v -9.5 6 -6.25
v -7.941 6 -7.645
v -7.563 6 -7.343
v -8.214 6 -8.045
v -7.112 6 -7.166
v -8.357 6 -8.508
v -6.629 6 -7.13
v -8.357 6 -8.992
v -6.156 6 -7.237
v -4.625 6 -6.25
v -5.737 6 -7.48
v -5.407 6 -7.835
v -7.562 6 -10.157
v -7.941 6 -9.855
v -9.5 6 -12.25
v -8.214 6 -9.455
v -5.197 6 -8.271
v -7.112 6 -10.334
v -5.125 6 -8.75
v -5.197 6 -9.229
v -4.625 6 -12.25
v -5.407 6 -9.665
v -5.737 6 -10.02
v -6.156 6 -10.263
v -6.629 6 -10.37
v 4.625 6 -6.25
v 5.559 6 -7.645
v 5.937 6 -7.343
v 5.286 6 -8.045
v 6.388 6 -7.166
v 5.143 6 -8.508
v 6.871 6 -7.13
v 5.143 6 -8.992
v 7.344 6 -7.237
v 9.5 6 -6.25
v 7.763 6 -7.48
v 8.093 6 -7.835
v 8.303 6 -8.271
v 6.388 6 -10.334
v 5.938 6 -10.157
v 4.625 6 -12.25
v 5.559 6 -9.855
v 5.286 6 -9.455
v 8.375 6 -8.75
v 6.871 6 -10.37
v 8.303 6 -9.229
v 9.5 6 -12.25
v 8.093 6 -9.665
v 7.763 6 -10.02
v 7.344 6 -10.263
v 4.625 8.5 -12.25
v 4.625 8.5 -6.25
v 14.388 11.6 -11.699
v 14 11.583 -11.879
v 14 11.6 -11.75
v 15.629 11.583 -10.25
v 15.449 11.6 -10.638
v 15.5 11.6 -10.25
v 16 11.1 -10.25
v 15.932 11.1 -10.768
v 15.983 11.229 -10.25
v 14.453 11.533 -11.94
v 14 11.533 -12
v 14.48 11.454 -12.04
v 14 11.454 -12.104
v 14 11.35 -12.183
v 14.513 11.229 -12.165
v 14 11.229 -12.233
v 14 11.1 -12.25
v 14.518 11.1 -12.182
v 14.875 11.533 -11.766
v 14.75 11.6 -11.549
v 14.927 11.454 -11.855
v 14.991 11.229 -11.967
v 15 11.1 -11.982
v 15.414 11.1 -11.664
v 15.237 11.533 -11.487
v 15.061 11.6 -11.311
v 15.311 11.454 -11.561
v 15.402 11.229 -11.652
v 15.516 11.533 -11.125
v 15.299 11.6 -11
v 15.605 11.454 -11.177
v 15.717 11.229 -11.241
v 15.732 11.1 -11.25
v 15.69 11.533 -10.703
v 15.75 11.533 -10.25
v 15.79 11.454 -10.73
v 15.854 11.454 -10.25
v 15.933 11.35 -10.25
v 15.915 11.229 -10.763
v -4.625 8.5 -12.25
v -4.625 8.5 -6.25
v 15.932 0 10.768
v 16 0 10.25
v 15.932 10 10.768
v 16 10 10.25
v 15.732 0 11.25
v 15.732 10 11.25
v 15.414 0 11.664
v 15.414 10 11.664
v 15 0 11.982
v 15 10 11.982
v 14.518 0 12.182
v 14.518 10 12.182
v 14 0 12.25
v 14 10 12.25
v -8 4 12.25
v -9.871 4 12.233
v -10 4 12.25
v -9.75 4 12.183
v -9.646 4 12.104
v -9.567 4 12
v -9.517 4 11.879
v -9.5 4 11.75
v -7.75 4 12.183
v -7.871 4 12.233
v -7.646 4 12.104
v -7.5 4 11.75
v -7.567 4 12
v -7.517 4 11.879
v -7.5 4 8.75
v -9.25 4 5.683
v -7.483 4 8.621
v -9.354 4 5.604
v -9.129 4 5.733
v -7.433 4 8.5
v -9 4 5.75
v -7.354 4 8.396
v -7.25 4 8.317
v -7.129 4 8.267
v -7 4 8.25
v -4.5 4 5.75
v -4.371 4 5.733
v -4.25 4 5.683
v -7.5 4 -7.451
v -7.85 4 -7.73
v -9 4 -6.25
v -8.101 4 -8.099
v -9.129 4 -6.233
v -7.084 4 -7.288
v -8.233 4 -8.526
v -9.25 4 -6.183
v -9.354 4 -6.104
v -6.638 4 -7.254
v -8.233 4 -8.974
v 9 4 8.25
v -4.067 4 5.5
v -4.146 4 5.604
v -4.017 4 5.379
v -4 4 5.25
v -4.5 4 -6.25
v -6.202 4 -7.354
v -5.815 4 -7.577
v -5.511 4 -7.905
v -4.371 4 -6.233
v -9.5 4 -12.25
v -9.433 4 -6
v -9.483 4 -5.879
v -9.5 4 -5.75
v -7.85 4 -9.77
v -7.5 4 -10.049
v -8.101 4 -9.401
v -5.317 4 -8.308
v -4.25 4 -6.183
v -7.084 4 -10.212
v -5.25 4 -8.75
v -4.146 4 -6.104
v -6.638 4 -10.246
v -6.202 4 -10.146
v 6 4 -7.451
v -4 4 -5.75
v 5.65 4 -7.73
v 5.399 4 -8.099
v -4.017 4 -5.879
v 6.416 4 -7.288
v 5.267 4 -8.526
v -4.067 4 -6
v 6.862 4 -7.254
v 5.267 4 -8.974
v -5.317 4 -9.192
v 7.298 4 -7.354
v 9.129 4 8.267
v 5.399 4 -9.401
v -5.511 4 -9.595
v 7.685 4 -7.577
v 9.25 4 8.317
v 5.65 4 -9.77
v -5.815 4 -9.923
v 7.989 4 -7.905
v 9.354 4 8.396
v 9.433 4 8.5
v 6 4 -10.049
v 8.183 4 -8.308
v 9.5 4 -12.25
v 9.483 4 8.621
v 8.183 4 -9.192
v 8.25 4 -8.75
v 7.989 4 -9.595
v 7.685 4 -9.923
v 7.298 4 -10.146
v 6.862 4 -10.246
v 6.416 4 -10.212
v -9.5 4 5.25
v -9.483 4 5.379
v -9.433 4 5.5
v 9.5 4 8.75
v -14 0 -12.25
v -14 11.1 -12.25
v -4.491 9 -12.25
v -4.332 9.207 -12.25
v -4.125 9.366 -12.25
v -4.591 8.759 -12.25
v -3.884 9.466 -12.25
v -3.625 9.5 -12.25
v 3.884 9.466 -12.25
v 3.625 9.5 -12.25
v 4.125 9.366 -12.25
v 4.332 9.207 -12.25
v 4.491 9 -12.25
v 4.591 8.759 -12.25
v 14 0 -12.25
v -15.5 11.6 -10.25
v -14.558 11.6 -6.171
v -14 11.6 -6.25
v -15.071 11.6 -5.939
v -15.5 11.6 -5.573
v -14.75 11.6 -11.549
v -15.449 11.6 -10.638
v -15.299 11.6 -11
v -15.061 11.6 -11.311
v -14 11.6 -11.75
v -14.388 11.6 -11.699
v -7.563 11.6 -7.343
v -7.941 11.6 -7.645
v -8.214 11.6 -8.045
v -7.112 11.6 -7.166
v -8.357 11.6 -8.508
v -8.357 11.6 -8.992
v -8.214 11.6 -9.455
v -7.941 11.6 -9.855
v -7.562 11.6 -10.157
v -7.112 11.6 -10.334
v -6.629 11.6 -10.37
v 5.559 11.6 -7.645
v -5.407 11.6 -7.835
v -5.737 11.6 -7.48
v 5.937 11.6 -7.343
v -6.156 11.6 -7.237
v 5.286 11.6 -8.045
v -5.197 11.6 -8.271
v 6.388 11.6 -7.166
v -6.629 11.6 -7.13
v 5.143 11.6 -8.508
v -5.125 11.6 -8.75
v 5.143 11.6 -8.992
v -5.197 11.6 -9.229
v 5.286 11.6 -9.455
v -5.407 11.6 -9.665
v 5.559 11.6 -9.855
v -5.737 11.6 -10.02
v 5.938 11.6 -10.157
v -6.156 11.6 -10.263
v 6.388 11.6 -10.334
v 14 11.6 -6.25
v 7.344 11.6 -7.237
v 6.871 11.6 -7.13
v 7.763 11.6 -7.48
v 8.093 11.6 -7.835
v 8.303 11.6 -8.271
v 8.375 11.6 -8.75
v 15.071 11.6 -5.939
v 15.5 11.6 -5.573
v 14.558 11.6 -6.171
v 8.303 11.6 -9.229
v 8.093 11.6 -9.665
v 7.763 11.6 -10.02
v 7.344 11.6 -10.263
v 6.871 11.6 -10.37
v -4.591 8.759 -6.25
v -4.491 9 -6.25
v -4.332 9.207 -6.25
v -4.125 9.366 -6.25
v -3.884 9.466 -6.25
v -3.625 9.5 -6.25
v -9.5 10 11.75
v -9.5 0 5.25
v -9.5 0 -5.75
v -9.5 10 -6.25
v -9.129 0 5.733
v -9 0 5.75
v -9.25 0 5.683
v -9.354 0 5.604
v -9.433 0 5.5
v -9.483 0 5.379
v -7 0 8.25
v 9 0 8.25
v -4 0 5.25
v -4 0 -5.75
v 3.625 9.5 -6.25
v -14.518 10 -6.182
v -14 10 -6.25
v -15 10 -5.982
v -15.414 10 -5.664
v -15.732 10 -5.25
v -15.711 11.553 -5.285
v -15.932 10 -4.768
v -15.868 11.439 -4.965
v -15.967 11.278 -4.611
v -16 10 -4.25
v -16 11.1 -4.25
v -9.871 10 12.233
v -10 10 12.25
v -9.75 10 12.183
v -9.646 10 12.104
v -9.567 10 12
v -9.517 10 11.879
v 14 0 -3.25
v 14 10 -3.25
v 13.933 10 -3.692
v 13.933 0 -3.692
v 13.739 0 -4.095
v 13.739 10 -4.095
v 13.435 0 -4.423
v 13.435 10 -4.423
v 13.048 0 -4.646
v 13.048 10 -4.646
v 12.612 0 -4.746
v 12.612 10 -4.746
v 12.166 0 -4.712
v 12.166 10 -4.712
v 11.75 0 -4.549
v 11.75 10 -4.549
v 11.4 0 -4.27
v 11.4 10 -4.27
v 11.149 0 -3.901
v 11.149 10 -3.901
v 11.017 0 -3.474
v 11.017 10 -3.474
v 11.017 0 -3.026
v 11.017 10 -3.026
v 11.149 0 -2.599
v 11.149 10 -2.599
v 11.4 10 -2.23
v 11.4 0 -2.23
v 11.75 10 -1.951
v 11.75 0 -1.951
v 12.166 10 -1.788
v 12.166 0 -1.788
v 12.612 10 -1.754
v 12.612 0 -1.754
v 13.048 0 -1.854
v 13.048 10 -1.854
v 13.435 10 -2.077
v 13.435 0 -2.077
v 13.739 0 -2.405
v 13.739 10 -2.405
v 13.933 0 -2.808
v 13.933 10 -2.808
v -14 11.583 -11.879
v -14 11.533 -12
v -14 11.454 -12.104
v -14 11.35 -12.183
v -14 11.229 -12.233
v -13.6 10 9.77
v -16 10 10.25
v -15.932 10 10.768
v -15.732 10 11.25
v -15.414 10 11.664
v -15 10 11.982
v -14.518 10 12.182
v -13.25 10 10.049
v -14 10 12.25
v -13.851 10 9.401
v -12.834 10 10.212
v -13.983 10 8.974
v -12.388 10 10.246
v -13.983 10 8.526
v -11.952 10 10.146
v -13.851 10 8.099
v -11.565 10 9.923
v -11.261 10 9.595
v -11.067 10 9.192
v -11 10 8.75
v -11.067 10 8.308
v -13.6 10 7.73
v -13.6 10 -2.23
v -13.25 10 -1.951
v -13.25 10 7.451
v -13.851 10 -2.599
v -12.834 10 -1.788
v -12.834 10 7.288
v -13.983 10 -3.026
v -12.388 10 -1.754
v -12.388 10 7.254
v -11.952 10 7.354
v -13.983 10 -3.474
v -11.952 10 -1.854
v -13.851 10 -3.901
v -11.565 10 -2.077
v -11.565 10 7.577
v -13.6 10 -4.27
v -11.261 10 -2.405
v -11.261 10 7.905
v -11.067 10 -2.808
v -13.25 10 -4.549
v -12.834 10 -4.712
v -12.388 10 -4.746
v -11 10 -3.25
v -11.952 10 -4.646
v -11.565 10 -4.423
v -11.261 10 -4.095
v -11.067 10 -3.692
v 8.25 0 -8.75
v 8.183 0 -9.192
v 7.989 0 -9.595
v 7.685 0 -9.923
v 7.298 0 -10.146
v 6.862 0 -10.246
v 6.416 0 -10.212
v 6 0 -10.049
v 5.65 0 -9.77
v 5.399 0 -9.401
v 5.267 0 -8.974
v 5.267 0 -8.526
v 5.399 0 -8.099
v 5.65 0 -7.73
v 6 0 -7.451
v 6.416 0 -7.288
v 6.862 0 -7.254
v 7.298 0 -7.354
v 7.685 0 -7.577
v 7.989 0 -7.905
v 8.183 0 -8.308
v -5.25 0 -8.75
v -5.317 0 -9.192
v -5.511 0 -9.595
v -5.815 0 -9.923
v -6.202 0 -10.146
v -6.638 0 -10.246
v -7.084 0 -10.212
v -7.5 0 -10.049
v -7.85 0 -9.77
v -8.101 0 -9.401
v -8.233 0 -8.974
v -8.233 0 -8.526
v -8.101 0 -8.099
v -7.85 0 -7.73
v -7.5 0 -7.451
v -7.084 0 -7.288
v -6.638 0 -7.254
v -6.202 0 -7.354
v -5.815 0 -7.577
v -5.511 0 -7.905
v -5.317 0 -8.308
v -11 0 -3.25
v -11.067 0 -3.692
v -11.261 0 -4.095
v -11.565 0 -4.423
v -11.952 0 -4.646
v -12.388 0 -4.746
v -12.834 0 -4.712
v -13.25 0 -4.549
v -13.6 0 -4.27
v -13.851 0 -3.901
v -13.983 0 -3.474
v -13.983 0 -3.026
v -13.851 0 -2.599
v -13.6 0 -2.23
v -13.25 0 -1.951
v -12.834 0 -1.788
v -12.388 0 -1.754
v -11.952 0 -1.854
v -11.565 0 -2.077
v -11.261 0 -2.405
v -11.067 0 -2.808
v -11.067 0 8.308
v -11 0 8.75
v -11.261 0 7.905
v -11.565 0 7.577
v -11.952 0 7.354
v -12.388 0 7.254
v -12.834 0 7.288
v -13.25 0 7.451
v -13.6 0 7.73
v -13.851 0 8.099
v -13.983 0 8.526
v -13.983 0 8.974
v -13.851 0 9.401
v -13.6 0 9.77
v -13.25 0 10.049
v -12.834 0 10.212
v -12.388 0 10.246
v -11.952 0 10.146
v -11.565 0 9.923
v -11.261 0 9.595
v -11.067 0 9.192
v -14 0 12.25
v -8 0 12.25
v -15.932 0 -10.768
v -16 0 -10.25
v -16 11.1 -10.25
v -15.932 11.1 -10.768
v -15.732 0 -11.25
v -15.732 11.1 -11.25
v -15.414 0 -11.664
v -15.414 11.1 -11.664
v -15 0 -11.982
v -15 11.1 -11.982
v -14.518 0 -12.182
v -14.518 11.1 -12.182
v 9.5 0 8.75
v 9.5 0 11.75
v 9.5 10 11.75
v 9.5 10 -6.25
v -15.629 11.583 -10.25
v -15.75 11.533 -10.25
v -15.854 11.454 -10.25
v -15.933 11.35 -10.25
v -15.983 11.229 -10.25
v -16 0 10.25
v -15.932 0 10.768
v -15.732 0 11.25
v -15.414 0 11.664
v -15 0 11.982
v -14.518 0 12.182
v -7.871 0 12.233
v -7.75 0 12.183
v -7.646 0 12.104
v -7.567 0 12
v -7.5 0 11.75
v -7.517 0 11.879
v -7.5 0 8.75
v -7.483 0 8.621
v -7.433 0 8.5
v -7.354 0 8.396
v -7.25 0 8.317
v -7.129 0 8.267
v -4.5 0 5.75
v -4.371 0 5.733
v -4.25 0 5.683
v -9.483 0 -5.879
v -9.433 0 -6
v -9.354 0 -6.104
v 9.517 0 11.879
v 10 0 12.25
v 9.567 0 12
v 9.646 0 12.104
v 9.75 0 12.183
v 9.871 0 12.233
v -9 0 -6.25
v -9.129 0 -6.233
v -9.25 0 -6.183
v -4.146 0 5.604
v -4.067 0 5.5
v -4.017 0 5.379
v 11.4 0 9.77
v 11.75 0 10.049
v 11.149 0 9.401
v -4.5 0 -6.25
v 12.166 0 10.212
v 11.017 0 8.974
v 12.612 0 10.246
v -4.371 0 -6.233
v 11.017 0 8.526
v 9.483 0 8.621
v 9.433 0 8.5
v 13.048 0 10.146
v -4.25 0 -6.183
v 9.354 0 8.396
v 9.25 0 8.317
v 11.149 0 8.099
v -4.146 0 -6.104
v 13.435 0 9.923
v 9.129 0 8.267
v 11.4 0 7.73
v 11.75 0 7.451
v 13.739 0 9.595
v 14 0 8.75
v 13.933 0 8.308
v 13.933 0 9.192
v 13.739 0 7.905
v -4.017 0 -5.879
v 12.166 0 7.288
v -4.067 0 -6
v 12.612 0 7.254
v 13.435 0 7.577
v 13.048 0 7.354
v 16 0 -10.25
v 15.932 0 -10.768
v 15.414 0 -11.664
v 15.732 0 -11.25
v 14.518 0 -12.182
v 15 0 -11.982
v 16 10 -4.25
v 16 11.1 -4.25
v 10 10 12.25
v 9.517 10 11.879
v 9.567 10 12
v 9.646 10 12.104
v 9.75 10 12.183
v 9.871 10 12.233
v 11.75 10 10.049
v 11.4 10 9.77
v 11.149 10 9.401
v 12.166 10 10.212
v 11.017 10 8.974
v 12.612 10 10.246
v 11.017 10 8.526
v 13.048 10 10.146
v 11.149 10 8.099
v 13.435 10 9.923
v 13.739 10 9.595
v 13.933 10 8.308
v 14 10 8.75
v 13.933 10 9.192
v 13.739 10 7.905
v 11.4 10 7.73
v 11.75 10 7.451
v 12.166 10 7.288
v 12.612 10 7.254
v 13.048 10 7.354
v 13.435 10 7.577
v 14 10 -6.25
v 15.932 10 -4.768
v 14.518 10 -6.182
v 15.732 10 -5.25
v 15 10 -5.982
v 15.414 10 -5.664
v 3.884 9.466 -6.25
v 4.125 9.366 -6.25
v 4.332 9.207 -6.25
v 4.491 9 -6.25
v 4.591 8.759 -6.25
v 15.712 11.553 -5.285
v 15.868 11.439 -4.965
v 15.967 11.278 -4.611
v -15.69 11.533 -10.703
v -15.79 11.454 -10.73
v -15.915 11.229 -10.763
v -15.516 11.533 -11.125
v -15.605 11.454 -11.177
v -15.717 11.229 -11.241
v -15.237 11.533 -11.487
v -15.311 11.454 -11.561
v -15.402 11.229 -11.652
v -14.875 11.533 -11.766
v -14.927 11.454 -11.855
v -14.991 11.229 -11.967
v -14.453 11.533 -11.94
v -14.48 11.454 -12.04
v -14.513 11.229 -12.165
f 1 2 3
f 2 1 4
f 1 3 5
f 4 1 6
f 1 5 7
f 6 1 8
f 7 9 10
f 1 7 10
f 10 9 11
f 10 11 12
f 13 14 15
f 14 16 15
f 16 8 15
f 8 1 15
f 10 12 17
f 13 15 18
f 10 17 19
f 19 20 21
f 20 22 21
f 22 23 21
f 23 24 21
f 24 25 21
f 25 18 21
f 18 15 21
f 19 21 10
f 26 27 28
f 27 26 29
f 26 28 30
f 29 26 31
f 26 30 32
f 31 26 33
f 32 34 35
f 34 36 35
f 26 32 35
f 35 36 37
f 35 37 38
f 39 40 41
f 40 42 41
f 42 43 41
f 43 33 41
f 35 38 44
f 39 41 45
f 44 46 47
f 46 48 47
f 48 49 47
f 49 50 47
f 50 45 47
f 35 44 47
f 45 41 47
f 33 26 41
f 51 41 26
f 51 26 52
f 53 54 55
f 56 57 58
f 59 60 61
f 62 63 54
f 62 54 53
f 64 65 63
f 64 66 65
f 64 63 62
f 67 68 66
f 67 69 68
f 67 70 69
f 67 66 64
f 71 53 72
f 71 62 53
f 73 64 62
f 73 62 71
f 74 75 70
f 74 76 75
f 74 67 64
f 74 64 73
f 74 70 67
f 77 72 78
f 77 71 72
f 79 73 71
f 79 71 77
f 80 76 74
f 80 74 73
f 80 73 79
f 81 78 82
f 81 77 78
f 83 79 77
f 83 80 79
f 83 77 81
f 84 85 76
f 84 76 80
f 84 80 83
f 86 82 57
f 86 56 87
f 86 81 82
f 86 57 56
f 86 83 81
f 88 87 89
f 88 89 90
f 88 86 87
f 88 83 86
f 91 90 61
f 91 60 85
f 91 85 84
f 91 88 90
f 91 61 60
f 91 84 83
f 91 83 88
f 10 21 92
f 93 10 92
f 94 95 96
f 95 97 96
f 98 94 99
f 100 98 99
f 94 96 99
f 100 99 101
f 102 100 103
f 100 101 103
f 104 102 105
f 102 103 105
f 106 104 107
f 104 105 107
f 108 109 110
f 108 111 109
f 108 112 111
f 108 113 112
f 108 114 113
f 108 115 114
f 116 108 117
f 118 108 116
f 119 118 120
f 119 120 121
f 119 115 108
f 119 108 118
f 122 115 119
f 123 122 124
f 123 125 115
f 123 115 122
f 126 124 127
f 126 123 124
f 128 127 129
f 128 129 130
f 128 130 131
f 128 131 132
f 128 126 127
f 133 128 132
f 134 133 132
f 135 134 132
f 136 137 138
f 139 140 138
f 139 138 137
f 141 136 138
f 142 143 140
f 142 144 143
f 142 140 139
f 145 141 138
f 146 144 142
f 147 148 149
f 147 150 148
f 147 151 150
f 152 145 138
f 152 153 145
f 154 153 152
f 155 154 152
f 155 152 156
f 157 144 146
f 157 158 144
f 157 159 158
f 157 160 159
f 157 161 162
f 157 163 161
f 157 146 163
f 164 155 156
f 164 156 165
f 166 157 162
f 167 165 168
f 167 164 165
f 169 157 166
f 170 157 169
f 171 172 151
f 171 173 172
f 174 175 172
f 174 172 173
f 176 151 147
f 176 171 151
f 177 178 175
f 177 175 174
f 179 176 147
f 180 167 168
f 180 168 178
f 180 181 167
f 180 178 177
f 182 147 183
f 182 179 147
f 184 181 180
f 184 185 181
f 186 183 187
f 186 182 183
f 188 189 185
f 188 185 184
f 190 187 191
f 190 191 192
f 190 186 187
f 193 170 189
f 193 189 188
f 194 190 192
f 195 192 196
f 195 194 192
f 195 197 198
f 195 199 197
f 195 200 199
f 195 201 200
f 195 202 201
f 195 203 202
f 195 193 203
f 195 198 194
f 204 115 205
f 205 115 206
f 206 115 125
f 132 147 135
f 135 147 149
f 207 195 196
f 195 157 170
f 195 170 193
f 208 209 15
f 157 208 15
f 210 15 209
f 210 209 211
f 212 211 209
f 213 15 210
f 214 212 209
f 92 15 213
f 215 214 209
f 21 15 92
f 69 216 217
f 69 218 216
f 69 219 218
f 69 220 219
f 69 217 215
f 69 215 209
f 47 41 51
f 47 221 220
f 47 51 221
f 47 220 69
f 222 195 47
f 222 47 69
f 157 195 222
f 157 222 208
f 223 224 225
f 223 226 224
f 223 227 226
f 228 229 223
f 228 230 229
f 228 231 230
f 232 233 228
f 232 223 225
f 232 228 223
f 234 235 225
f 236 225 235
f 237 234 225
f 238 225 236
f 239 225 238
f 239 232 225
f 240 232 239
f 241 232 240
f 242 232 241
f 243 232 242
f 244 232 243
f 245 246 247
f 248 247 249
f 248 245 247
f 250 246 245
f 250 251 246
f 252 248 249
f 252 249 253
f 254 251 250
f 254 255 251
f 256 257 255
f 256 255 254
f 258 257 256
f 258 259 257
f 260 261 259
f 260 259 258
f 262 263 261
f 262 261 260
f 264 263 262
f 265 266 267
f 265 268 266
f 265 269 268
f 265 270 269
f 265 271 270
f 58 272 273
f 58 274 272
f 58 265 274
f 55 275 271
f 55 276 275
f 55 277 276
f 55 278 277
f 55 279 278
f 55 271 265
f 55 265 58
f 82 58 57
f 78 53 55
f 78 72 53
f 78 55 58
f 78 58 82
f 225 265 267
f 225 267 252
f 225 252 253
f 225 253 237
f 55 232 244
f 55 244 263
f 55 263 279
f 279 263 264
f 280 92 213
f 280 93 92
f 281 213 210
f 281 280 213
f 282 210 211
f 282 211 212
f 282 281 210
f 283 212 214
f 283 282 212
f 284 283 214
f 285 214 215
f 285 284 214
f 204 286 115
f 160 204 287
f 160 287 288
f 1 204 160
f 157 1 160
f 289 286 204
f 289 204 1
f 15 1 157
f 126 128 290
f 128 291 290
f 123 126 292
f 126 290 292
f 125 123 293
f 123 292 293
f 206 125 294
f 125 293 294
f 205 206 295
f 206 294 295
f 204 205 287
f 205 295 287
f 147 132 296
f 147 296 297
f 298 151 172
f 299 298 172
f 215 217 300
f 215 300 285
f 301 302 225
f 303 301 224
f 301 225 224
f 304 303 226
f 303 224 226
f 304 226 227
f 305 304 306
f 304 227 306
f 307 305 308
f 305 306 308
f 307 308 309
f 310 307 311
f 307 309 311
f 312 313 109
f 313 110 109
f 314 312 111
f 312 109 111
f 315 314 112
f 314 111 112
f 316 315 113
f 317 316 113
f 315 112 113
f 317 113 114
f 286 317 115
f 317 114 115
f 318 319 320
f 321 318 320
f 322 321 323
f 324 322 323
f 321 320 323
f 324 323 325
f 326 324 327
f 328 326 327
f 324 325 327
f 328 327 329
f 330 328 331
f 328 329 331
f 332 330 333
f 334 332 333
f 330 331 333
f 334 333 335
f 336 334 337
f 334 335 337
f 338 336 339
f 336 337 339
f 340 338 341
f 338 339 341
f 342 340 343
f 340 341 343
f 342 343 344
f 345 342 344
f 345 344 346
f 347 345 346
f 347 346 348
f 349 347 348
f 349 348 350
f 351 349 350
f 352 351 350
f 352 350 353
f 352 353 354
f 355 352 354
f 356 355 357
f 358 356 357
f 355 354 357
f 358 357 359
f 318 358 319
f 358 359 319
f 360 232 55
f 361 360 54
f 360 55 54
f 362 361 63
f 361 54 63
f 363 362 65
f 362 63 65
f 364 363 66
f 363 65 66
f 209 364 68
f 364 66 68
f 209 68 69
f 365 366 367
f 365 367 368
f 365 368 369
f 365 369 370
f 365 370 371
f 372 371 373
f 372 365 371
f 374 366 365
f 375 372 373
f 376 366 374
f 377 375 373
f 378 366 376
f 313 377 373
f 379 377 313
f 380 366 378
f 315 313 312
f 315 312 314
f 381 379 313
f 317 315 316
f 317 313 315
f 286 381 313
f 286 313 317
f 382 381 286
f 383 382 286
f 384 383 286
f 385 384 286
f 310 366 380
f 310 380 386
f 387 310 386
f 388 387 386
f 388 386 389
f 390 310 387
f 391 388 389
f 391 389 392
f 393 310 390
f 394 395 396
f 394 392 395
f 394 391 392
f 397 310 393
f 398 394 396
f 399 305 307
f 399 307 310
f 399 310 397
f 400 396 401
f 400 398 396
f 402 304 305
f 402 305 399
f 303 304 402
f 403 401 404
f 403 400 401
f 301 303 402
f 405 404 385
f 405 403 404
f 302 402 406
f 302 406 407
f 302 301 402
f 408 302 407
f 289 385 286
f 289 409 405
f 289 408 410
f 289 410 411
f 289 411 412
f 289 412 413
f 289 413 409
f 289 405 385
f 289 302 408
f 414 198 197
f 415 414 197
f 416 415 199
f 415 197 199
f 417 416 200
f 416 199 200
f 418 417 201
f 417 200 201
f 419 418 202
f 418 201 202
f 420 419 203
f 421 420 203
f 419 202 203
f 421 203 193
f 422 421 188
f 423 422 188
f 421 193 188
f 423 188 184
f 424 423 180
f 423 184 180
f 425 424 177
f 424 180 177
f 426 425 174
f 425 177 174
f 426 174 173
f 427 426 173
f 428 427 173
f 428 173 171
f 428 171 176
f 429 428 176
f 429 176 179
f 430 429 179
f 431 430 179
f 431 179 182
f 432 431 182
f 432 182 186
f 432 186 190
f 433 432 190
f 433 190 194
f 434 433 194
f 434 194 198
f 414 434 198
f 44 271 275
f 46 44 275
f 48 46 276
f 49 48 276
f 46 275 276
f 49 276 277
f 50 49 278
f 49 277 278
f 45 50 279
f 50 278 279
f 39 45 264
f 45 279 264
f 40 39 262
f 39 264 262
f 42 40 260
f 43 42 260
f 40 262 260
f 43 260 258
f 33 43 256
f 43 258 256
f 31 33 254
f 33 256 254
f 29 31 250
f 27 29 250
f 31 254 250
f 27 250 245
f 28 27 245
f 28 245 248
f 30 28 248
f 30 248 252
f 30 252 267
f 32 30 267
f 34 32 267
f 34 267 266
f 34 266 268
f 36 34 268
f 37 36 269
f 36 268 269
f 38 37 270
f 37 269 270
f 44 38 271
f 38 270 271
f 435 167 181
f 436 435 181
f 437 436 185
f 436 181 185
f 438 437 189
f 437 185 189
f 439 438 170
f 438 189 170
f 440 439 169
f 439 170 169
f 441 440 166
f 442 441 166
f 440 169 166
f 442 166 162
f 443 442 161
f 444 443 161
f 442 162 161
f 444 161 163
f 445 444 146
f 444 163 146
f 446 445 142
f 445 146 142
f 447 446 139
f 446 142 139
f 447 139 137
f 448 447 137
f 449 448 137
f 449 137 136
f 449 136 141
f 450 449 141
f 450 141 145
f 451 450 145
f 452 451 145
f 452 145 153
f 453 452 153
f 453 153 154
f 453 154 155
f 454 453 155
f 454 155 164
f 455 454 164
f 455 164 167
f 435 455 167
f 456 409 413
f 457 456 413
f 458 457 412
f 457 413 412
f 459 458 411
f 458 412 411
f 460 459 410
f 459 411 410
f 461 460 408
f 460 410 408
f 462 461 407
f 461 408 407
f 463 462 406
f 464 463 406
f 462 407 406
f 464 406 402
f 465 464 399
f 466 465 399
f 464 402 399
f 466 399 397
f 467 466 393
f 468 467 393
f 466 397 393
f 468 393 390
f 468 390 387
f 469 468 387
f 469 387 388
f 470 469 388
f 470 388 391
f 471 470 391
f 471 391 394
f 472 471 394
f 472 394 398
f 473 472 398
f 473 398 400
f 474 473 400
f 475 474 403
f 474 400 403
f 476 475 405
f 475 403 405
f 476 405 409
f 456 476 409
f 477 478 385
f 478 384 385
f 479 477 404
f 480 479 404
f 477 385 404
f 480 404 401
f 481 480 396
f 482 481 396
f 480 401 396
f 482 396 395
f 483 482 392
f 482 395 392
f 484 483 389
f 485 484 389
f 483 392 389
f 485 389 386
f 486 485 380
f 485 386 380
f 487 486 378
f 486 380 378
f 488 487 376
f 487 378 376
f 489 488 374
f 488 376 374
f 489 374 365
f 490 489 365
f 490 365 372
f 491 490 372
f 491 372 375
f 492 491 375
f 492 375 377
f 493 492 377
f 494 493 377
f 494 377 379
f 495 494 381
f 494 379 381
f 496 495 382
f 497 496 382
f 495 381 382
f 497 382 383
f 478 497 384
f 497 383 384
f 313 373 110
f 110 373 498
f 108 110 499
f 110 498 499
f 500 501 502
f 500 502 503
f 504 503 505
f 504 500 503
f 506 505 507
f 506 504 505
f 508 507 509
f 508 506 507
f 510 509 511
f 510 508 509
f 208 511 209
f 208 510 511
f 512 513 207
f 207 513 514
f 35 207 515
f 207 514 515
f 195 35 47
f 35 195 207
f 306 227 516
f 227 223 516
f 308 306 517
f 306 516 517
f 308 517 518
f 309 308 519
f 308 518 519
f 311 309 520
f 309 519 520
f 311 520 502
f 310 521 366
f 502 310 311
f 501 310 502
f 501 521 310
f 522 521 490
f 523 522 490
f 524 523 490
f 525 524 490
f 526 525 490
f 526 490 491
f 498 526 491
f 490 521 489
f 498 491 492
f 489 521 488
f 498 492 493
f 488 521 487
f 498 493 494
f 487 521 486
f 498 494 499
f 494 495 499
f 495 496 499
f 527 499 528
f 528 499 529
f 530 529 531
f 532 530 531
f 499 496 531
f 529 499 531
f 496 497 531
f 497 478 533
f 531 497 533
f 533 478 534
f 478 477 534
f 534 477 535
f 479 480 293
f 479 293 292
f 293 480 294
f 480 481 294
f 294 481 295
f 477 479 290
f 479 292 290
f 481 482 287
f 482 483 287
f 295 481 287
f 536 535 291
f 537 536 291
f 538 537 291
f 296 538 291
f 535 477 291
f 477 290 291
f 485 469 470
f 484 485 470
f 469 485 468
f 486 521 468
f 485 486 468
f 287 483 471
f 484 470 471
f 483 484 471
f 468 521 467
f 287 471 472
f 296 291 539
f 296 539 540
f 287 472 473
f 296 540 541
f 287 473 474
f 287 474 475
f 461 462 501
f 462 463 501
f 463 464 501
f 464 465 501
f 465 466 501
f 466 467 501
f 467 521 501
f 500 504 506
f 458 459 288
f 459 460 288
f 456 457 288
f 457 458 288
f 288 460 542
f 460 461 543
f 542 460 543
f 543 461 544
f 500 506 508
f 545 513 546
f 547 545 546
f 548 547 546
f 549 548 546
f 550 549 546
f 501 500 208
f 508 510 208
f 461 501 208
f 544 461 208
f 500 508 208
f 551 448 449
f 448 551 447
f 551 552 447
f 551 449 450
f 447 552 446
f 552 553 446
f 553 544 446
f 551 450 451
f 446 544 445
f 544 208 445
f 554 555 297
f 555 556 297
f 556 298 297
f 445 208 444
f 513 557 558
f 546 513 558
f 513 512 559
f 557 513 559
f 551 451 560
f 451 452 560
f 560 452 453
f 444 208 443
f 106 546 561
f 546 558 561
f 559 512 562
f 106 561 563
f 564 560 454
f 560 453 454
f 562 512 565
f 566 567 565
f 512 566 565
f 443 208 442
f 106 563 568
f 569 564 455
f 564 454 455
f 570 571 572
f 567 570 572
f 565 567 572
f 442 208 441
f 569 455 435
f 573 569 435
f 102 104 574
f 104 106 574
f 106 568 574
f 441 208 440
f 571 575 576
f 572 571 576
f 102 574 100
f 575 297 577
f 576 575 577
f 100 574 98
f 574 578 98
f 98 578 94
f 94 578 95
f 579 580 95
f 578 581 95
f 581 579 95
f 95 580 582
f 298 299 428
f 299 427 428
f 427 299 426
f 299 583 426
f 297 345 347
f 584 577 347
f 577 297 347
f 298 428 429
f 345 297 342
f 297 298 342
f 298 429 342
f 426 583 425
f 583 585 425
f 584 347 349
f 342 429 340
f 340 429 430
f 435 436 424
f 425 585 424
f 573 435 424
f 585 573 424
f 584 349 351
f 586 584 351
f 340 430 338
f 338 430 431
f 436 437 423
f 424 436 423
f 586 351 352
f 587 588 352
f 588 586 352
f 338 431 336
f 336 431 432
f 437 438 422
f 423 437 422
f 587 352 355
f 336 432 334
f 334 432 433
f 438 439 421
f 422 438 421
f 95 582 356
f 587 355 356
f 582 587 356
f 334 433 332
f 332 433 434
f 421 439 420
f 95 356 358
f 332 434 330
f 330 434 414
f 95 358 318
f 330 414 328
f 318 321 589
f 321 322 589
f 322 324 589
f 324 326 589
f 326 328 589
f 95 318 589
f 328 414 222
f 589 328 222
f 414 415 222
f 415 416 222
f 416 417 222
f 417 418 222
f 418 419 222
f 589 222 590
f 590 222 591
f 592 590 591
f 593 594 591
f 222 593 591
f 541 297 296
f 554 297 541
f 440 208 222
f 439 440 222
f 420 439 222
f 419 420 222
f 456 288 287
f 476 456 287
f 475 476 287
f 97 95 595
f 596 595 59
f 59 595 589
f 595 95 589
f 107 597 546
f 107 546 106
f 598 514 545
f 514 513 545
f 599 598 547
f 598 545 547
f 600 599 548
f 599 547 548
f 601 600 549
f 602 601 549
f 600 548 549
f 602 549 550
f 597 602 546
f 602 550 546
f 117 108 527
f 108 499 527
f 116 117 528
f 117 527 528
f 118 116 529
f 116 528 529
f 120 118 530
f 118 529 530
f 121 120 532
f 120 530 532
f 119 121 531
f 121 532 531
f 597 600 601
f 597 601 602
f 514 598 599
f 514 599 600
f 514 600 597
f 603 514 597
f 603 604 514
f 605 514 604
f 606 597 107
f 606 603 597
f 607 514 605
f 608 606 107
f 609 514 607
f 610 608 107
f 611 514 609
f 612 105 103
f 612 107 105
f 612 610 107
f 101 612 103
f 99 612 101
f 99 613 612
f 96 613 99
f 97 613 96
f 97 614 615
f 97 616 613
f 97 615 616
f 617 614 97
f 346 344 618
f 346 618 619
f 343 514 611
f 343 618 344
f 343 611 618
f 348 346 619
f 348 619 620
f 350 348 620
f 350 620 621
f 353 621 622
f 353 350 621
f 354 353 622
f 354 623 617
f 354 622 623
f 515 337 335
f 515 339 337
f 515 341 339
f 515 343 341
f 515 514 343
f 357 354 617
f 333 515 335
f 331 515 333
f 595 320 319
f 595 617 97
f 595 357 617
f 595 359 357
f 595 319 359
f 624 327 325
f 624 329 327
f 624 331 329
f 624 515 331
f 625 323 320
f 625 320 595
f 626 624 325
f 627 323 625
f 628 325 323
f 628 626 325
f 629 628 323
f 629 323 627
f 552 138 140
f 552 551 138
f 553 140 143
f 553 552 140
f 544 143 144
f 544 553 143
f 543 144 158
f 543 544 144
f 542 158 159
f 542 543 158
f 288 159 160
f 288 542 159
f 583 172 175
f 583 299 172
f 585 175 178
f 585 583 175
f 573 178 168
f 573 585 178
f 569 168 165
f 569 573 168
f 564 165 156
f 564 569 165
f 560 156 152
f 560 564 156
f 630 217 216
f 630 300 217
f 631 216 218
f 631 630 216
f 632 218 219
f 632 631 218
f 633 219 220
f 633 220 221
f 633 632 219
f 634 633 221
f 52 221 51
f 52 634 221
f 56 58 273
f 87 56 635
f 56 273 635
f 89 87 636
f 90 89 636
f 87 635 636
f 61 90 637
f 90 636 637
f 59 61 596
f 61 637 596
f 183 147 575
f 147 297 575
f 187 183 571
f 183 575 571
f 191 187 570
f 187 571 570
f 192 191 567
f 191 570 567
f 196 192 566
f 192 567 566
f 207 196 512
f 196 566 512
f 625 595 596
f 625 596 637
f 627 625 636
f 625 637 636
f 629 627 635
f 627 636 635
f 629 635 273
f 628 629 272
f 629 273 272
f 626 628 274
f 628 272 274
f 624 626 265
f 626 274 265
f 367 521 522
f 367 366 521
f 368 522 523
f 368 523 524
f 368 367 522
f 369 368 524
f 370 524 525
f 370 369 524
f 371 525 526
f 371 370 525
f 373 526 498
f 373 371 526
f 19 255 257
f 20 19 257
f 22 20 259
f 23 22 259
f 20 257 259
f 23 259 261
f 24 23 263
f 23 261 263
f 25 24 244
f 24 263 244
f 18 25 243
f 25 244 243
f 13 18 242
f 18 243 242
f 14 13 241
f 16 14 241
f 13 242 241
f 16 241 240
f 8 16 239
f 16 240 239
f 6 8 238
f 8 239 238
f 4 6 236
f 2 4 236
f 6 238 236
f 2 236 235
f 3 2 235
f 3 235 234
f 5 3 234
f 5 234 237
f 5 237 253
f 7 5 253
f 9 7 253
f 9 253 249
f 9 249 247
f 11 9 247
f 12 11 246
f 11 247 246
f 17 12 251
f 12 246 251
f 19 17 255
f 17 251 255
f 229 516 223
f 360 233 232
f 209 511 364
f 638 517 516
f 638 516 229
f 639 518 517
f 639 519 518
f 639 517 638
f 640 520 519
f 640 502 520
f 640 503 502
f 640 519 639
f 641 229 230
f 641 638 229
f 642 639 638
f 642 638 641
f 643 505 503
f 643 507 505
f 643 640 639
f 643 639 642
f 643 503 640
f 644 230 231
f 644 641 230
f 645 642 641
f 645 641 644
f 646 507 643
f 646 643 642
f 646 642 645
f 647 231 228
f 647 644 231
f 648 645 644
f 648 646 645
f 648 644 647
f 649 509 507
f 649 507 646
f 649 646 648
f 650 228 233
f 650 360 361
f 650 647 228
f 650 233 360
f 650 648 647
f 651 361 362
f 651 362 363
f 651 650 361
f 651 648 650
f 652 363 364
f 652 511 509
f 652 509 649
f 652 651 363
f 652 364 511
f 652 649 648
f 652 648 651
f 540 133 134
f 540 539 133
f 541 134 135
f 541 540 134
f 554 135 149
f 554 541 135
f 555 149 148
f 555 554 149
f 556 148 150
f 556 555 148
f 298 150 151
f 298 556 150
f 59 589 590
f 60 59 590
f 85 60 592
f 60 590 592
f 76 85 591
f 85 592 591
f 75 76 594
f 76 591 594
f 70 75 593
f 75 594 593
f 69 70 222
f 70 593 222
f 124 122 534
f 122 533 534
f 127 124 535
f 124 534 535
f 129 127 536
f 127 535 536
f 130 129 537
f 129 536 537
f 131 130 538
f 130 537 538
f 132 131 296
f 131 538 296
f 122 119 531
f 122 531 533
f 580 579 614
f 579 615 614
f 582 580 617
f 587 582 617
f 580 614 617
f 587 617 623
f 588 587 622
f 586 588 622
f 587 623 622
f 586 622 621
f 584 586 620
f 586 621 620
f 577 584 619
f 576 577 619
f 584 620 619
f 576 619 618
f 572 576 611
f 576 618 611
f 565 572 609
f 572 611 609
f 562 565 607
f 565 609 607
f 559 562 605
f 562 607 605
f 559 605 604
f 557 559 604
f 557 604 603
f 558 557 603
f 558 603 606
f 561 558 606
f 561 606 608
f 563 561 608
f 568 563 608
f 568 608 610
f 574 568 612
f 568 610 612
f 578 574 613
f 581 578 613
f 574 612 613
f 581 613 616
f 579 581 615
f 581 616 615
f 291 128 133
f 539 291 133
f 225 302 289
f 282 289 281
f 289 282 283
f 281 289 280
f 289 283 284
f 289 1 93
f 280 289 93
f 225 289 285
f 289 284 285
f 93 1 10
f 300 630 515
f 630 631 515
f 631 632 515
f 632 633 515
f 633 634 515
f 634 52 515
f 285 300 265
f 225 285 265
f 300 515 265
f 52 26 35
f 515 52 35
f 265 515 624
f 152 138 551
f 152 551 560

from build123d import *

# Parameters (mm, degrees)
SKETCH1_W               = 32
SKETCH1_H               = 24.5
BOSS_EXTRUDE1_DEPTH     = 10
SKETCH2_W               = 19
SKETCH2_H               = 24.5
CUT_EXTRUDE1_DEPTH      = 6
BOSS_EXTRUDE2_START     = -4
SKETCH12_W              = 32
SKETCH12_H              = 6
BOSS_EXTRUDE2_DEPTH     = 5.6
SKETCH13_W              = 9.25
SKETCH13_H              = 3.5
CUT_EXTRUDE7_DEPTH      = 25.5
SKETCH9_R               = 1.5
CUT_EXTRUDE5_DEPTH      = 8.6
CUT_EXTRUDE5_DEPTH_BACK = 5
SKETCH3_R               = 1.5
CUT_EXTRUDE2_DEPTH      = 4
SKETCH4_R               = 1.5
CUT_EXTRUDE3_DEPTH      = 7
SKETCH6_W               = 5.5
SKETCH6_H               = 12
SKETCH6_W_2             = 17
SKETCH6_H_2             = 4
CUT_EXTRUDE4_DEPTH      = 8.6
CUT_EXTRUDE4_DEPTH_BACK = 5
SKETCH16_W              = 2
SKETCH16_H              = 2
BOSS_EXTRUDE3_DEPTH     = 1.6
SKETCH17_R              = 2
CUT_EXTRUDE10_DEPTH     = 1.6
FILLET1_R               = 2
FILLET3_R               = 0.5
FILLET4_R               = 0.5
FILLET5_R               = 1
SKETCH14_R              = 1.625
CUT_EXTRUDE8_DEPTH      = 5.6


with BuildPart() as part:
    # Sketch1 → Boss-Extrude1 (new body)
    with BuildSketch(Plane(origin=(0, 0, 0), x_dir=(1, 0, 0), z_dir=(0, 1, 0))):
        Rectangle(SKETCH1_W, SKETCH1_H)
    extrude(amount=BOSS_EXTRUDE1_DEPTH)

    # Sketch2 → Cut-Extrude1 (cut)
    with BuildSketch(Plane(origin=(0, 10, 0), x_dir=(1, 0, 0), z_dir=(0, 1, 0))):
        Rectangle(SKETCH2_W, SKETCH2_H)
    extrude(amount=-CUT_EXTRUDE1_DEPTH, mode=Mode.SUBTRACT)

    # Sketch12 → Boss-Extrude2 (add)
    with BuildSketch(Plane(origin=(0, 10, 0), x_dir=(1, 0, 0), z_dir=(0, 1, 0)).offset(BOSS_EXTRUDE2_START)):
        with Locations((0, 9.25)):
            Rectangle(SKETCH12_W, SKETCH12_H)
    extrude(amount=BOSS_EXTRUDE2_DEPTH)

    # Sketch13 → Cut-Extrude7 (cut, through all)
    with BuildSketch(Plane(origin=(0, 0, -12.25), x_dir=(-1, 0, 0), z_dir=(0, 0, -1))):
        with Locations((0, 7.75)):
            Rectangle(SKETCH13_W, SKETCH13_H)
    extrude(amount=-CUT_EXTRUDE7_DEPTH, mode=Mode.SUBTRACT)

    # Sketch9 → Cut-Extrude5 (cut, two sides)
    with BuildSketch(Plane(origin=(0, 4, 0), x_dir=(1, 0, 0), z_dir=(0, 1, 0))) as cut_extrude5_sk:
        with Locations((-6.75, 8.75)):
            Circle(SKETCH9_R)
        with Locations((6.75, 8.75)):
            Circle(SKETCH9_R)
    extrude(amount=CUT_EXTRUDE5_DEPTH, mode=Mode.SUBTRACT)
    extrude(cut_extrude5_sk.sketch, amount=-CUT_EXTRUDE5_DEPTH_BACK, mode=Mode.SUBTRACT)

    # Sketch3 → Cut-Extrude2 (cut)
    with BuildSketch(Plane(origin=(0, 10, 0), x_dir=(1, 0, 0), z_dir=(0, 1, 0))):
        with Locations((-12.5, 3.25)):
            Circle(SKETCH3_R)
        with Locations((-12.5, -8.75)):
            Circle(SKETCH3_R)
        with Locations((12.5, -8.75)):
            Circle(SKETCH3_R)
        with Locations((12.5, 3.25)):
            Circle(SKETCH3_R)
        with Locations((-6.75, 8.75)):
            Circle(SKETCH3_R)
        with Locations((6.75, 8.75)):
            Circle(SKETCH3_R)
    extrude(amount=-CUT_EXTRUDE2_DEPTH, mode=Mode.SUBTRACT)

    # Sketch4 → Cut-Extrude3 (cut, through all)
    with BuildSketch(Plane(origin=(0, 6, 0), x_dir=(1, 0, 0), z_dir=(0, 1, 0))):
        with Locations((-12.5, 3.25)):
            Circle(SKETCH4_R)
        with Locations((-12.5, -8.75)):
            Circle(SKETCH4_R)
        with Locations((12.5, 3.25)):
            Circle(SKETCH4_R)
        with Locations((12.5, -8.75)):
            Circle(SKETCH4_R)
    extrude(amount=-CUT_EXTRUDE3_DEPTH, mode=Mode.SUBTRACT)

    # Sketch6 → Cut-Extrude4 (cut, two sides)
    with BuildSketch(Plane(origin=(0, 4, 0), x_dir=(1, 0, 0), z_dir=(0, 1, 0))) as cut_extrude4_sk:
        with Locations((-6.75, 0.25)):
            Rectangle(SKETCH6_W, SKETCH6_H)
        with Locations((1, -10.25)):
            Rectangle(SKETCH6_W_2, SKETCH6_H_2)
    extrude(amount=CUT_EXTRUDE4_DEPTH, mode=Mode.SUBTRACT)
    extrude(cut_extrude4_sk.sketch, amount=-CUT_EXTRUDE4_DEPTH_BACK, mode=Mode.SUBTRACT)

    # Sketch16 → Boss-Extrude3 (add)
    with BuildSketch(Plane(origin=(0, 10, 0), x_dir=(1, 0, 0), z_dir=(0, 1, 0))):
        with Locations((-15, 5.25)):
            Rectangle(SKETCH16_W, SKETCH16_H)
        with Locations((15, 5.25)):
            Rectangle(SKETCH16_W, SKETCH16_H)
    extrude(amount=BOSS_EXTRUDE3_DEPTH)

    # Sketch17 → Cut-Extrude10 (cut)
    with BuildSketch(Plane(origin=(0, 11.6, 0), x_dir=(1, 0, 0), z_dir=(0, 1, 0))):
        with Locations((-14, 4.25)):
            Circle(SKETCH17_R)
        with Locations((14, 4.25)):
            Circle(SKETCH17_R)
    extrude(amount=-CUT_EXTRUDE10_DEPTH, mode=Mode.SUBTRACT)

    # Fillet1
    fillet1_edges = [part.edges().sort_by_distance(p)[0] for p in [
        (16, 5, 12.25),
        (-16, 5, 12.25),
        (-16, 5.8, -12.25),
        (16, 5.8, -12.25),
    ]]
    fillet(fillet1_edges, radius=FILLET1_R)

    # Fillet3
    fillet3_edges = [part.edges().sort_by_distance(p)[0] for p in [
        (-9.5, 2, 5.75),
        (-9.5, 2, -6.25),
        (-4, 2, -6.25),
        (-4, 2, 5.75),
        (9.5, 2, 8.25),
        (-7.5, 2, 12.25),
        (-7.5, 2, 8.25),
        (9.5, 5, 12.25),
        (-9.5, 7, 12.25),
    ]]
    fillet(fillet3_edges, radius=FILLET3_R)

    # Fillet4
    fillet4_edges = [part.edges().sort_by_distance(p)[0] for p in [
        (-16, 11.6, -7.25),
        (0, 11.6, -12.25),
        (15.414213562, 11.6, -11.664213562),
        (-15.414213562, 11.6, -11.664213562),
        (16, 11.6, -7.25),
    ]]
    fillet(fillet4_edges, radius=FILLET4_R)

    # Fillet5
    fillet5_edges = [part.edges().sort_by_distance(p)[0] for p in [
        (-4.625, 9.5, -9.25),
        (4.625, 9.5, -9.25),
    ]]
    fillet(fillet5_edges, radius=FILLET5_R)

    # Sketch14 → Cut-Extrude8 (cut)
    with BuildSketch(Plane(origin=(0, 11.6, 0), x_dir=(1, 0, 0), z_dir=(0, 1, 0))):
        with Locations((6.75, 8.75)):
            Circle(SKETCH14_R)
        with Locations((-6.75, 8.75)):
            Circle(SKETCH14_R)
    extrude(amount=-CUT_EXTRUDE8_DEPTH, mode=Mode.SUBTRACT)


solid = part.part
